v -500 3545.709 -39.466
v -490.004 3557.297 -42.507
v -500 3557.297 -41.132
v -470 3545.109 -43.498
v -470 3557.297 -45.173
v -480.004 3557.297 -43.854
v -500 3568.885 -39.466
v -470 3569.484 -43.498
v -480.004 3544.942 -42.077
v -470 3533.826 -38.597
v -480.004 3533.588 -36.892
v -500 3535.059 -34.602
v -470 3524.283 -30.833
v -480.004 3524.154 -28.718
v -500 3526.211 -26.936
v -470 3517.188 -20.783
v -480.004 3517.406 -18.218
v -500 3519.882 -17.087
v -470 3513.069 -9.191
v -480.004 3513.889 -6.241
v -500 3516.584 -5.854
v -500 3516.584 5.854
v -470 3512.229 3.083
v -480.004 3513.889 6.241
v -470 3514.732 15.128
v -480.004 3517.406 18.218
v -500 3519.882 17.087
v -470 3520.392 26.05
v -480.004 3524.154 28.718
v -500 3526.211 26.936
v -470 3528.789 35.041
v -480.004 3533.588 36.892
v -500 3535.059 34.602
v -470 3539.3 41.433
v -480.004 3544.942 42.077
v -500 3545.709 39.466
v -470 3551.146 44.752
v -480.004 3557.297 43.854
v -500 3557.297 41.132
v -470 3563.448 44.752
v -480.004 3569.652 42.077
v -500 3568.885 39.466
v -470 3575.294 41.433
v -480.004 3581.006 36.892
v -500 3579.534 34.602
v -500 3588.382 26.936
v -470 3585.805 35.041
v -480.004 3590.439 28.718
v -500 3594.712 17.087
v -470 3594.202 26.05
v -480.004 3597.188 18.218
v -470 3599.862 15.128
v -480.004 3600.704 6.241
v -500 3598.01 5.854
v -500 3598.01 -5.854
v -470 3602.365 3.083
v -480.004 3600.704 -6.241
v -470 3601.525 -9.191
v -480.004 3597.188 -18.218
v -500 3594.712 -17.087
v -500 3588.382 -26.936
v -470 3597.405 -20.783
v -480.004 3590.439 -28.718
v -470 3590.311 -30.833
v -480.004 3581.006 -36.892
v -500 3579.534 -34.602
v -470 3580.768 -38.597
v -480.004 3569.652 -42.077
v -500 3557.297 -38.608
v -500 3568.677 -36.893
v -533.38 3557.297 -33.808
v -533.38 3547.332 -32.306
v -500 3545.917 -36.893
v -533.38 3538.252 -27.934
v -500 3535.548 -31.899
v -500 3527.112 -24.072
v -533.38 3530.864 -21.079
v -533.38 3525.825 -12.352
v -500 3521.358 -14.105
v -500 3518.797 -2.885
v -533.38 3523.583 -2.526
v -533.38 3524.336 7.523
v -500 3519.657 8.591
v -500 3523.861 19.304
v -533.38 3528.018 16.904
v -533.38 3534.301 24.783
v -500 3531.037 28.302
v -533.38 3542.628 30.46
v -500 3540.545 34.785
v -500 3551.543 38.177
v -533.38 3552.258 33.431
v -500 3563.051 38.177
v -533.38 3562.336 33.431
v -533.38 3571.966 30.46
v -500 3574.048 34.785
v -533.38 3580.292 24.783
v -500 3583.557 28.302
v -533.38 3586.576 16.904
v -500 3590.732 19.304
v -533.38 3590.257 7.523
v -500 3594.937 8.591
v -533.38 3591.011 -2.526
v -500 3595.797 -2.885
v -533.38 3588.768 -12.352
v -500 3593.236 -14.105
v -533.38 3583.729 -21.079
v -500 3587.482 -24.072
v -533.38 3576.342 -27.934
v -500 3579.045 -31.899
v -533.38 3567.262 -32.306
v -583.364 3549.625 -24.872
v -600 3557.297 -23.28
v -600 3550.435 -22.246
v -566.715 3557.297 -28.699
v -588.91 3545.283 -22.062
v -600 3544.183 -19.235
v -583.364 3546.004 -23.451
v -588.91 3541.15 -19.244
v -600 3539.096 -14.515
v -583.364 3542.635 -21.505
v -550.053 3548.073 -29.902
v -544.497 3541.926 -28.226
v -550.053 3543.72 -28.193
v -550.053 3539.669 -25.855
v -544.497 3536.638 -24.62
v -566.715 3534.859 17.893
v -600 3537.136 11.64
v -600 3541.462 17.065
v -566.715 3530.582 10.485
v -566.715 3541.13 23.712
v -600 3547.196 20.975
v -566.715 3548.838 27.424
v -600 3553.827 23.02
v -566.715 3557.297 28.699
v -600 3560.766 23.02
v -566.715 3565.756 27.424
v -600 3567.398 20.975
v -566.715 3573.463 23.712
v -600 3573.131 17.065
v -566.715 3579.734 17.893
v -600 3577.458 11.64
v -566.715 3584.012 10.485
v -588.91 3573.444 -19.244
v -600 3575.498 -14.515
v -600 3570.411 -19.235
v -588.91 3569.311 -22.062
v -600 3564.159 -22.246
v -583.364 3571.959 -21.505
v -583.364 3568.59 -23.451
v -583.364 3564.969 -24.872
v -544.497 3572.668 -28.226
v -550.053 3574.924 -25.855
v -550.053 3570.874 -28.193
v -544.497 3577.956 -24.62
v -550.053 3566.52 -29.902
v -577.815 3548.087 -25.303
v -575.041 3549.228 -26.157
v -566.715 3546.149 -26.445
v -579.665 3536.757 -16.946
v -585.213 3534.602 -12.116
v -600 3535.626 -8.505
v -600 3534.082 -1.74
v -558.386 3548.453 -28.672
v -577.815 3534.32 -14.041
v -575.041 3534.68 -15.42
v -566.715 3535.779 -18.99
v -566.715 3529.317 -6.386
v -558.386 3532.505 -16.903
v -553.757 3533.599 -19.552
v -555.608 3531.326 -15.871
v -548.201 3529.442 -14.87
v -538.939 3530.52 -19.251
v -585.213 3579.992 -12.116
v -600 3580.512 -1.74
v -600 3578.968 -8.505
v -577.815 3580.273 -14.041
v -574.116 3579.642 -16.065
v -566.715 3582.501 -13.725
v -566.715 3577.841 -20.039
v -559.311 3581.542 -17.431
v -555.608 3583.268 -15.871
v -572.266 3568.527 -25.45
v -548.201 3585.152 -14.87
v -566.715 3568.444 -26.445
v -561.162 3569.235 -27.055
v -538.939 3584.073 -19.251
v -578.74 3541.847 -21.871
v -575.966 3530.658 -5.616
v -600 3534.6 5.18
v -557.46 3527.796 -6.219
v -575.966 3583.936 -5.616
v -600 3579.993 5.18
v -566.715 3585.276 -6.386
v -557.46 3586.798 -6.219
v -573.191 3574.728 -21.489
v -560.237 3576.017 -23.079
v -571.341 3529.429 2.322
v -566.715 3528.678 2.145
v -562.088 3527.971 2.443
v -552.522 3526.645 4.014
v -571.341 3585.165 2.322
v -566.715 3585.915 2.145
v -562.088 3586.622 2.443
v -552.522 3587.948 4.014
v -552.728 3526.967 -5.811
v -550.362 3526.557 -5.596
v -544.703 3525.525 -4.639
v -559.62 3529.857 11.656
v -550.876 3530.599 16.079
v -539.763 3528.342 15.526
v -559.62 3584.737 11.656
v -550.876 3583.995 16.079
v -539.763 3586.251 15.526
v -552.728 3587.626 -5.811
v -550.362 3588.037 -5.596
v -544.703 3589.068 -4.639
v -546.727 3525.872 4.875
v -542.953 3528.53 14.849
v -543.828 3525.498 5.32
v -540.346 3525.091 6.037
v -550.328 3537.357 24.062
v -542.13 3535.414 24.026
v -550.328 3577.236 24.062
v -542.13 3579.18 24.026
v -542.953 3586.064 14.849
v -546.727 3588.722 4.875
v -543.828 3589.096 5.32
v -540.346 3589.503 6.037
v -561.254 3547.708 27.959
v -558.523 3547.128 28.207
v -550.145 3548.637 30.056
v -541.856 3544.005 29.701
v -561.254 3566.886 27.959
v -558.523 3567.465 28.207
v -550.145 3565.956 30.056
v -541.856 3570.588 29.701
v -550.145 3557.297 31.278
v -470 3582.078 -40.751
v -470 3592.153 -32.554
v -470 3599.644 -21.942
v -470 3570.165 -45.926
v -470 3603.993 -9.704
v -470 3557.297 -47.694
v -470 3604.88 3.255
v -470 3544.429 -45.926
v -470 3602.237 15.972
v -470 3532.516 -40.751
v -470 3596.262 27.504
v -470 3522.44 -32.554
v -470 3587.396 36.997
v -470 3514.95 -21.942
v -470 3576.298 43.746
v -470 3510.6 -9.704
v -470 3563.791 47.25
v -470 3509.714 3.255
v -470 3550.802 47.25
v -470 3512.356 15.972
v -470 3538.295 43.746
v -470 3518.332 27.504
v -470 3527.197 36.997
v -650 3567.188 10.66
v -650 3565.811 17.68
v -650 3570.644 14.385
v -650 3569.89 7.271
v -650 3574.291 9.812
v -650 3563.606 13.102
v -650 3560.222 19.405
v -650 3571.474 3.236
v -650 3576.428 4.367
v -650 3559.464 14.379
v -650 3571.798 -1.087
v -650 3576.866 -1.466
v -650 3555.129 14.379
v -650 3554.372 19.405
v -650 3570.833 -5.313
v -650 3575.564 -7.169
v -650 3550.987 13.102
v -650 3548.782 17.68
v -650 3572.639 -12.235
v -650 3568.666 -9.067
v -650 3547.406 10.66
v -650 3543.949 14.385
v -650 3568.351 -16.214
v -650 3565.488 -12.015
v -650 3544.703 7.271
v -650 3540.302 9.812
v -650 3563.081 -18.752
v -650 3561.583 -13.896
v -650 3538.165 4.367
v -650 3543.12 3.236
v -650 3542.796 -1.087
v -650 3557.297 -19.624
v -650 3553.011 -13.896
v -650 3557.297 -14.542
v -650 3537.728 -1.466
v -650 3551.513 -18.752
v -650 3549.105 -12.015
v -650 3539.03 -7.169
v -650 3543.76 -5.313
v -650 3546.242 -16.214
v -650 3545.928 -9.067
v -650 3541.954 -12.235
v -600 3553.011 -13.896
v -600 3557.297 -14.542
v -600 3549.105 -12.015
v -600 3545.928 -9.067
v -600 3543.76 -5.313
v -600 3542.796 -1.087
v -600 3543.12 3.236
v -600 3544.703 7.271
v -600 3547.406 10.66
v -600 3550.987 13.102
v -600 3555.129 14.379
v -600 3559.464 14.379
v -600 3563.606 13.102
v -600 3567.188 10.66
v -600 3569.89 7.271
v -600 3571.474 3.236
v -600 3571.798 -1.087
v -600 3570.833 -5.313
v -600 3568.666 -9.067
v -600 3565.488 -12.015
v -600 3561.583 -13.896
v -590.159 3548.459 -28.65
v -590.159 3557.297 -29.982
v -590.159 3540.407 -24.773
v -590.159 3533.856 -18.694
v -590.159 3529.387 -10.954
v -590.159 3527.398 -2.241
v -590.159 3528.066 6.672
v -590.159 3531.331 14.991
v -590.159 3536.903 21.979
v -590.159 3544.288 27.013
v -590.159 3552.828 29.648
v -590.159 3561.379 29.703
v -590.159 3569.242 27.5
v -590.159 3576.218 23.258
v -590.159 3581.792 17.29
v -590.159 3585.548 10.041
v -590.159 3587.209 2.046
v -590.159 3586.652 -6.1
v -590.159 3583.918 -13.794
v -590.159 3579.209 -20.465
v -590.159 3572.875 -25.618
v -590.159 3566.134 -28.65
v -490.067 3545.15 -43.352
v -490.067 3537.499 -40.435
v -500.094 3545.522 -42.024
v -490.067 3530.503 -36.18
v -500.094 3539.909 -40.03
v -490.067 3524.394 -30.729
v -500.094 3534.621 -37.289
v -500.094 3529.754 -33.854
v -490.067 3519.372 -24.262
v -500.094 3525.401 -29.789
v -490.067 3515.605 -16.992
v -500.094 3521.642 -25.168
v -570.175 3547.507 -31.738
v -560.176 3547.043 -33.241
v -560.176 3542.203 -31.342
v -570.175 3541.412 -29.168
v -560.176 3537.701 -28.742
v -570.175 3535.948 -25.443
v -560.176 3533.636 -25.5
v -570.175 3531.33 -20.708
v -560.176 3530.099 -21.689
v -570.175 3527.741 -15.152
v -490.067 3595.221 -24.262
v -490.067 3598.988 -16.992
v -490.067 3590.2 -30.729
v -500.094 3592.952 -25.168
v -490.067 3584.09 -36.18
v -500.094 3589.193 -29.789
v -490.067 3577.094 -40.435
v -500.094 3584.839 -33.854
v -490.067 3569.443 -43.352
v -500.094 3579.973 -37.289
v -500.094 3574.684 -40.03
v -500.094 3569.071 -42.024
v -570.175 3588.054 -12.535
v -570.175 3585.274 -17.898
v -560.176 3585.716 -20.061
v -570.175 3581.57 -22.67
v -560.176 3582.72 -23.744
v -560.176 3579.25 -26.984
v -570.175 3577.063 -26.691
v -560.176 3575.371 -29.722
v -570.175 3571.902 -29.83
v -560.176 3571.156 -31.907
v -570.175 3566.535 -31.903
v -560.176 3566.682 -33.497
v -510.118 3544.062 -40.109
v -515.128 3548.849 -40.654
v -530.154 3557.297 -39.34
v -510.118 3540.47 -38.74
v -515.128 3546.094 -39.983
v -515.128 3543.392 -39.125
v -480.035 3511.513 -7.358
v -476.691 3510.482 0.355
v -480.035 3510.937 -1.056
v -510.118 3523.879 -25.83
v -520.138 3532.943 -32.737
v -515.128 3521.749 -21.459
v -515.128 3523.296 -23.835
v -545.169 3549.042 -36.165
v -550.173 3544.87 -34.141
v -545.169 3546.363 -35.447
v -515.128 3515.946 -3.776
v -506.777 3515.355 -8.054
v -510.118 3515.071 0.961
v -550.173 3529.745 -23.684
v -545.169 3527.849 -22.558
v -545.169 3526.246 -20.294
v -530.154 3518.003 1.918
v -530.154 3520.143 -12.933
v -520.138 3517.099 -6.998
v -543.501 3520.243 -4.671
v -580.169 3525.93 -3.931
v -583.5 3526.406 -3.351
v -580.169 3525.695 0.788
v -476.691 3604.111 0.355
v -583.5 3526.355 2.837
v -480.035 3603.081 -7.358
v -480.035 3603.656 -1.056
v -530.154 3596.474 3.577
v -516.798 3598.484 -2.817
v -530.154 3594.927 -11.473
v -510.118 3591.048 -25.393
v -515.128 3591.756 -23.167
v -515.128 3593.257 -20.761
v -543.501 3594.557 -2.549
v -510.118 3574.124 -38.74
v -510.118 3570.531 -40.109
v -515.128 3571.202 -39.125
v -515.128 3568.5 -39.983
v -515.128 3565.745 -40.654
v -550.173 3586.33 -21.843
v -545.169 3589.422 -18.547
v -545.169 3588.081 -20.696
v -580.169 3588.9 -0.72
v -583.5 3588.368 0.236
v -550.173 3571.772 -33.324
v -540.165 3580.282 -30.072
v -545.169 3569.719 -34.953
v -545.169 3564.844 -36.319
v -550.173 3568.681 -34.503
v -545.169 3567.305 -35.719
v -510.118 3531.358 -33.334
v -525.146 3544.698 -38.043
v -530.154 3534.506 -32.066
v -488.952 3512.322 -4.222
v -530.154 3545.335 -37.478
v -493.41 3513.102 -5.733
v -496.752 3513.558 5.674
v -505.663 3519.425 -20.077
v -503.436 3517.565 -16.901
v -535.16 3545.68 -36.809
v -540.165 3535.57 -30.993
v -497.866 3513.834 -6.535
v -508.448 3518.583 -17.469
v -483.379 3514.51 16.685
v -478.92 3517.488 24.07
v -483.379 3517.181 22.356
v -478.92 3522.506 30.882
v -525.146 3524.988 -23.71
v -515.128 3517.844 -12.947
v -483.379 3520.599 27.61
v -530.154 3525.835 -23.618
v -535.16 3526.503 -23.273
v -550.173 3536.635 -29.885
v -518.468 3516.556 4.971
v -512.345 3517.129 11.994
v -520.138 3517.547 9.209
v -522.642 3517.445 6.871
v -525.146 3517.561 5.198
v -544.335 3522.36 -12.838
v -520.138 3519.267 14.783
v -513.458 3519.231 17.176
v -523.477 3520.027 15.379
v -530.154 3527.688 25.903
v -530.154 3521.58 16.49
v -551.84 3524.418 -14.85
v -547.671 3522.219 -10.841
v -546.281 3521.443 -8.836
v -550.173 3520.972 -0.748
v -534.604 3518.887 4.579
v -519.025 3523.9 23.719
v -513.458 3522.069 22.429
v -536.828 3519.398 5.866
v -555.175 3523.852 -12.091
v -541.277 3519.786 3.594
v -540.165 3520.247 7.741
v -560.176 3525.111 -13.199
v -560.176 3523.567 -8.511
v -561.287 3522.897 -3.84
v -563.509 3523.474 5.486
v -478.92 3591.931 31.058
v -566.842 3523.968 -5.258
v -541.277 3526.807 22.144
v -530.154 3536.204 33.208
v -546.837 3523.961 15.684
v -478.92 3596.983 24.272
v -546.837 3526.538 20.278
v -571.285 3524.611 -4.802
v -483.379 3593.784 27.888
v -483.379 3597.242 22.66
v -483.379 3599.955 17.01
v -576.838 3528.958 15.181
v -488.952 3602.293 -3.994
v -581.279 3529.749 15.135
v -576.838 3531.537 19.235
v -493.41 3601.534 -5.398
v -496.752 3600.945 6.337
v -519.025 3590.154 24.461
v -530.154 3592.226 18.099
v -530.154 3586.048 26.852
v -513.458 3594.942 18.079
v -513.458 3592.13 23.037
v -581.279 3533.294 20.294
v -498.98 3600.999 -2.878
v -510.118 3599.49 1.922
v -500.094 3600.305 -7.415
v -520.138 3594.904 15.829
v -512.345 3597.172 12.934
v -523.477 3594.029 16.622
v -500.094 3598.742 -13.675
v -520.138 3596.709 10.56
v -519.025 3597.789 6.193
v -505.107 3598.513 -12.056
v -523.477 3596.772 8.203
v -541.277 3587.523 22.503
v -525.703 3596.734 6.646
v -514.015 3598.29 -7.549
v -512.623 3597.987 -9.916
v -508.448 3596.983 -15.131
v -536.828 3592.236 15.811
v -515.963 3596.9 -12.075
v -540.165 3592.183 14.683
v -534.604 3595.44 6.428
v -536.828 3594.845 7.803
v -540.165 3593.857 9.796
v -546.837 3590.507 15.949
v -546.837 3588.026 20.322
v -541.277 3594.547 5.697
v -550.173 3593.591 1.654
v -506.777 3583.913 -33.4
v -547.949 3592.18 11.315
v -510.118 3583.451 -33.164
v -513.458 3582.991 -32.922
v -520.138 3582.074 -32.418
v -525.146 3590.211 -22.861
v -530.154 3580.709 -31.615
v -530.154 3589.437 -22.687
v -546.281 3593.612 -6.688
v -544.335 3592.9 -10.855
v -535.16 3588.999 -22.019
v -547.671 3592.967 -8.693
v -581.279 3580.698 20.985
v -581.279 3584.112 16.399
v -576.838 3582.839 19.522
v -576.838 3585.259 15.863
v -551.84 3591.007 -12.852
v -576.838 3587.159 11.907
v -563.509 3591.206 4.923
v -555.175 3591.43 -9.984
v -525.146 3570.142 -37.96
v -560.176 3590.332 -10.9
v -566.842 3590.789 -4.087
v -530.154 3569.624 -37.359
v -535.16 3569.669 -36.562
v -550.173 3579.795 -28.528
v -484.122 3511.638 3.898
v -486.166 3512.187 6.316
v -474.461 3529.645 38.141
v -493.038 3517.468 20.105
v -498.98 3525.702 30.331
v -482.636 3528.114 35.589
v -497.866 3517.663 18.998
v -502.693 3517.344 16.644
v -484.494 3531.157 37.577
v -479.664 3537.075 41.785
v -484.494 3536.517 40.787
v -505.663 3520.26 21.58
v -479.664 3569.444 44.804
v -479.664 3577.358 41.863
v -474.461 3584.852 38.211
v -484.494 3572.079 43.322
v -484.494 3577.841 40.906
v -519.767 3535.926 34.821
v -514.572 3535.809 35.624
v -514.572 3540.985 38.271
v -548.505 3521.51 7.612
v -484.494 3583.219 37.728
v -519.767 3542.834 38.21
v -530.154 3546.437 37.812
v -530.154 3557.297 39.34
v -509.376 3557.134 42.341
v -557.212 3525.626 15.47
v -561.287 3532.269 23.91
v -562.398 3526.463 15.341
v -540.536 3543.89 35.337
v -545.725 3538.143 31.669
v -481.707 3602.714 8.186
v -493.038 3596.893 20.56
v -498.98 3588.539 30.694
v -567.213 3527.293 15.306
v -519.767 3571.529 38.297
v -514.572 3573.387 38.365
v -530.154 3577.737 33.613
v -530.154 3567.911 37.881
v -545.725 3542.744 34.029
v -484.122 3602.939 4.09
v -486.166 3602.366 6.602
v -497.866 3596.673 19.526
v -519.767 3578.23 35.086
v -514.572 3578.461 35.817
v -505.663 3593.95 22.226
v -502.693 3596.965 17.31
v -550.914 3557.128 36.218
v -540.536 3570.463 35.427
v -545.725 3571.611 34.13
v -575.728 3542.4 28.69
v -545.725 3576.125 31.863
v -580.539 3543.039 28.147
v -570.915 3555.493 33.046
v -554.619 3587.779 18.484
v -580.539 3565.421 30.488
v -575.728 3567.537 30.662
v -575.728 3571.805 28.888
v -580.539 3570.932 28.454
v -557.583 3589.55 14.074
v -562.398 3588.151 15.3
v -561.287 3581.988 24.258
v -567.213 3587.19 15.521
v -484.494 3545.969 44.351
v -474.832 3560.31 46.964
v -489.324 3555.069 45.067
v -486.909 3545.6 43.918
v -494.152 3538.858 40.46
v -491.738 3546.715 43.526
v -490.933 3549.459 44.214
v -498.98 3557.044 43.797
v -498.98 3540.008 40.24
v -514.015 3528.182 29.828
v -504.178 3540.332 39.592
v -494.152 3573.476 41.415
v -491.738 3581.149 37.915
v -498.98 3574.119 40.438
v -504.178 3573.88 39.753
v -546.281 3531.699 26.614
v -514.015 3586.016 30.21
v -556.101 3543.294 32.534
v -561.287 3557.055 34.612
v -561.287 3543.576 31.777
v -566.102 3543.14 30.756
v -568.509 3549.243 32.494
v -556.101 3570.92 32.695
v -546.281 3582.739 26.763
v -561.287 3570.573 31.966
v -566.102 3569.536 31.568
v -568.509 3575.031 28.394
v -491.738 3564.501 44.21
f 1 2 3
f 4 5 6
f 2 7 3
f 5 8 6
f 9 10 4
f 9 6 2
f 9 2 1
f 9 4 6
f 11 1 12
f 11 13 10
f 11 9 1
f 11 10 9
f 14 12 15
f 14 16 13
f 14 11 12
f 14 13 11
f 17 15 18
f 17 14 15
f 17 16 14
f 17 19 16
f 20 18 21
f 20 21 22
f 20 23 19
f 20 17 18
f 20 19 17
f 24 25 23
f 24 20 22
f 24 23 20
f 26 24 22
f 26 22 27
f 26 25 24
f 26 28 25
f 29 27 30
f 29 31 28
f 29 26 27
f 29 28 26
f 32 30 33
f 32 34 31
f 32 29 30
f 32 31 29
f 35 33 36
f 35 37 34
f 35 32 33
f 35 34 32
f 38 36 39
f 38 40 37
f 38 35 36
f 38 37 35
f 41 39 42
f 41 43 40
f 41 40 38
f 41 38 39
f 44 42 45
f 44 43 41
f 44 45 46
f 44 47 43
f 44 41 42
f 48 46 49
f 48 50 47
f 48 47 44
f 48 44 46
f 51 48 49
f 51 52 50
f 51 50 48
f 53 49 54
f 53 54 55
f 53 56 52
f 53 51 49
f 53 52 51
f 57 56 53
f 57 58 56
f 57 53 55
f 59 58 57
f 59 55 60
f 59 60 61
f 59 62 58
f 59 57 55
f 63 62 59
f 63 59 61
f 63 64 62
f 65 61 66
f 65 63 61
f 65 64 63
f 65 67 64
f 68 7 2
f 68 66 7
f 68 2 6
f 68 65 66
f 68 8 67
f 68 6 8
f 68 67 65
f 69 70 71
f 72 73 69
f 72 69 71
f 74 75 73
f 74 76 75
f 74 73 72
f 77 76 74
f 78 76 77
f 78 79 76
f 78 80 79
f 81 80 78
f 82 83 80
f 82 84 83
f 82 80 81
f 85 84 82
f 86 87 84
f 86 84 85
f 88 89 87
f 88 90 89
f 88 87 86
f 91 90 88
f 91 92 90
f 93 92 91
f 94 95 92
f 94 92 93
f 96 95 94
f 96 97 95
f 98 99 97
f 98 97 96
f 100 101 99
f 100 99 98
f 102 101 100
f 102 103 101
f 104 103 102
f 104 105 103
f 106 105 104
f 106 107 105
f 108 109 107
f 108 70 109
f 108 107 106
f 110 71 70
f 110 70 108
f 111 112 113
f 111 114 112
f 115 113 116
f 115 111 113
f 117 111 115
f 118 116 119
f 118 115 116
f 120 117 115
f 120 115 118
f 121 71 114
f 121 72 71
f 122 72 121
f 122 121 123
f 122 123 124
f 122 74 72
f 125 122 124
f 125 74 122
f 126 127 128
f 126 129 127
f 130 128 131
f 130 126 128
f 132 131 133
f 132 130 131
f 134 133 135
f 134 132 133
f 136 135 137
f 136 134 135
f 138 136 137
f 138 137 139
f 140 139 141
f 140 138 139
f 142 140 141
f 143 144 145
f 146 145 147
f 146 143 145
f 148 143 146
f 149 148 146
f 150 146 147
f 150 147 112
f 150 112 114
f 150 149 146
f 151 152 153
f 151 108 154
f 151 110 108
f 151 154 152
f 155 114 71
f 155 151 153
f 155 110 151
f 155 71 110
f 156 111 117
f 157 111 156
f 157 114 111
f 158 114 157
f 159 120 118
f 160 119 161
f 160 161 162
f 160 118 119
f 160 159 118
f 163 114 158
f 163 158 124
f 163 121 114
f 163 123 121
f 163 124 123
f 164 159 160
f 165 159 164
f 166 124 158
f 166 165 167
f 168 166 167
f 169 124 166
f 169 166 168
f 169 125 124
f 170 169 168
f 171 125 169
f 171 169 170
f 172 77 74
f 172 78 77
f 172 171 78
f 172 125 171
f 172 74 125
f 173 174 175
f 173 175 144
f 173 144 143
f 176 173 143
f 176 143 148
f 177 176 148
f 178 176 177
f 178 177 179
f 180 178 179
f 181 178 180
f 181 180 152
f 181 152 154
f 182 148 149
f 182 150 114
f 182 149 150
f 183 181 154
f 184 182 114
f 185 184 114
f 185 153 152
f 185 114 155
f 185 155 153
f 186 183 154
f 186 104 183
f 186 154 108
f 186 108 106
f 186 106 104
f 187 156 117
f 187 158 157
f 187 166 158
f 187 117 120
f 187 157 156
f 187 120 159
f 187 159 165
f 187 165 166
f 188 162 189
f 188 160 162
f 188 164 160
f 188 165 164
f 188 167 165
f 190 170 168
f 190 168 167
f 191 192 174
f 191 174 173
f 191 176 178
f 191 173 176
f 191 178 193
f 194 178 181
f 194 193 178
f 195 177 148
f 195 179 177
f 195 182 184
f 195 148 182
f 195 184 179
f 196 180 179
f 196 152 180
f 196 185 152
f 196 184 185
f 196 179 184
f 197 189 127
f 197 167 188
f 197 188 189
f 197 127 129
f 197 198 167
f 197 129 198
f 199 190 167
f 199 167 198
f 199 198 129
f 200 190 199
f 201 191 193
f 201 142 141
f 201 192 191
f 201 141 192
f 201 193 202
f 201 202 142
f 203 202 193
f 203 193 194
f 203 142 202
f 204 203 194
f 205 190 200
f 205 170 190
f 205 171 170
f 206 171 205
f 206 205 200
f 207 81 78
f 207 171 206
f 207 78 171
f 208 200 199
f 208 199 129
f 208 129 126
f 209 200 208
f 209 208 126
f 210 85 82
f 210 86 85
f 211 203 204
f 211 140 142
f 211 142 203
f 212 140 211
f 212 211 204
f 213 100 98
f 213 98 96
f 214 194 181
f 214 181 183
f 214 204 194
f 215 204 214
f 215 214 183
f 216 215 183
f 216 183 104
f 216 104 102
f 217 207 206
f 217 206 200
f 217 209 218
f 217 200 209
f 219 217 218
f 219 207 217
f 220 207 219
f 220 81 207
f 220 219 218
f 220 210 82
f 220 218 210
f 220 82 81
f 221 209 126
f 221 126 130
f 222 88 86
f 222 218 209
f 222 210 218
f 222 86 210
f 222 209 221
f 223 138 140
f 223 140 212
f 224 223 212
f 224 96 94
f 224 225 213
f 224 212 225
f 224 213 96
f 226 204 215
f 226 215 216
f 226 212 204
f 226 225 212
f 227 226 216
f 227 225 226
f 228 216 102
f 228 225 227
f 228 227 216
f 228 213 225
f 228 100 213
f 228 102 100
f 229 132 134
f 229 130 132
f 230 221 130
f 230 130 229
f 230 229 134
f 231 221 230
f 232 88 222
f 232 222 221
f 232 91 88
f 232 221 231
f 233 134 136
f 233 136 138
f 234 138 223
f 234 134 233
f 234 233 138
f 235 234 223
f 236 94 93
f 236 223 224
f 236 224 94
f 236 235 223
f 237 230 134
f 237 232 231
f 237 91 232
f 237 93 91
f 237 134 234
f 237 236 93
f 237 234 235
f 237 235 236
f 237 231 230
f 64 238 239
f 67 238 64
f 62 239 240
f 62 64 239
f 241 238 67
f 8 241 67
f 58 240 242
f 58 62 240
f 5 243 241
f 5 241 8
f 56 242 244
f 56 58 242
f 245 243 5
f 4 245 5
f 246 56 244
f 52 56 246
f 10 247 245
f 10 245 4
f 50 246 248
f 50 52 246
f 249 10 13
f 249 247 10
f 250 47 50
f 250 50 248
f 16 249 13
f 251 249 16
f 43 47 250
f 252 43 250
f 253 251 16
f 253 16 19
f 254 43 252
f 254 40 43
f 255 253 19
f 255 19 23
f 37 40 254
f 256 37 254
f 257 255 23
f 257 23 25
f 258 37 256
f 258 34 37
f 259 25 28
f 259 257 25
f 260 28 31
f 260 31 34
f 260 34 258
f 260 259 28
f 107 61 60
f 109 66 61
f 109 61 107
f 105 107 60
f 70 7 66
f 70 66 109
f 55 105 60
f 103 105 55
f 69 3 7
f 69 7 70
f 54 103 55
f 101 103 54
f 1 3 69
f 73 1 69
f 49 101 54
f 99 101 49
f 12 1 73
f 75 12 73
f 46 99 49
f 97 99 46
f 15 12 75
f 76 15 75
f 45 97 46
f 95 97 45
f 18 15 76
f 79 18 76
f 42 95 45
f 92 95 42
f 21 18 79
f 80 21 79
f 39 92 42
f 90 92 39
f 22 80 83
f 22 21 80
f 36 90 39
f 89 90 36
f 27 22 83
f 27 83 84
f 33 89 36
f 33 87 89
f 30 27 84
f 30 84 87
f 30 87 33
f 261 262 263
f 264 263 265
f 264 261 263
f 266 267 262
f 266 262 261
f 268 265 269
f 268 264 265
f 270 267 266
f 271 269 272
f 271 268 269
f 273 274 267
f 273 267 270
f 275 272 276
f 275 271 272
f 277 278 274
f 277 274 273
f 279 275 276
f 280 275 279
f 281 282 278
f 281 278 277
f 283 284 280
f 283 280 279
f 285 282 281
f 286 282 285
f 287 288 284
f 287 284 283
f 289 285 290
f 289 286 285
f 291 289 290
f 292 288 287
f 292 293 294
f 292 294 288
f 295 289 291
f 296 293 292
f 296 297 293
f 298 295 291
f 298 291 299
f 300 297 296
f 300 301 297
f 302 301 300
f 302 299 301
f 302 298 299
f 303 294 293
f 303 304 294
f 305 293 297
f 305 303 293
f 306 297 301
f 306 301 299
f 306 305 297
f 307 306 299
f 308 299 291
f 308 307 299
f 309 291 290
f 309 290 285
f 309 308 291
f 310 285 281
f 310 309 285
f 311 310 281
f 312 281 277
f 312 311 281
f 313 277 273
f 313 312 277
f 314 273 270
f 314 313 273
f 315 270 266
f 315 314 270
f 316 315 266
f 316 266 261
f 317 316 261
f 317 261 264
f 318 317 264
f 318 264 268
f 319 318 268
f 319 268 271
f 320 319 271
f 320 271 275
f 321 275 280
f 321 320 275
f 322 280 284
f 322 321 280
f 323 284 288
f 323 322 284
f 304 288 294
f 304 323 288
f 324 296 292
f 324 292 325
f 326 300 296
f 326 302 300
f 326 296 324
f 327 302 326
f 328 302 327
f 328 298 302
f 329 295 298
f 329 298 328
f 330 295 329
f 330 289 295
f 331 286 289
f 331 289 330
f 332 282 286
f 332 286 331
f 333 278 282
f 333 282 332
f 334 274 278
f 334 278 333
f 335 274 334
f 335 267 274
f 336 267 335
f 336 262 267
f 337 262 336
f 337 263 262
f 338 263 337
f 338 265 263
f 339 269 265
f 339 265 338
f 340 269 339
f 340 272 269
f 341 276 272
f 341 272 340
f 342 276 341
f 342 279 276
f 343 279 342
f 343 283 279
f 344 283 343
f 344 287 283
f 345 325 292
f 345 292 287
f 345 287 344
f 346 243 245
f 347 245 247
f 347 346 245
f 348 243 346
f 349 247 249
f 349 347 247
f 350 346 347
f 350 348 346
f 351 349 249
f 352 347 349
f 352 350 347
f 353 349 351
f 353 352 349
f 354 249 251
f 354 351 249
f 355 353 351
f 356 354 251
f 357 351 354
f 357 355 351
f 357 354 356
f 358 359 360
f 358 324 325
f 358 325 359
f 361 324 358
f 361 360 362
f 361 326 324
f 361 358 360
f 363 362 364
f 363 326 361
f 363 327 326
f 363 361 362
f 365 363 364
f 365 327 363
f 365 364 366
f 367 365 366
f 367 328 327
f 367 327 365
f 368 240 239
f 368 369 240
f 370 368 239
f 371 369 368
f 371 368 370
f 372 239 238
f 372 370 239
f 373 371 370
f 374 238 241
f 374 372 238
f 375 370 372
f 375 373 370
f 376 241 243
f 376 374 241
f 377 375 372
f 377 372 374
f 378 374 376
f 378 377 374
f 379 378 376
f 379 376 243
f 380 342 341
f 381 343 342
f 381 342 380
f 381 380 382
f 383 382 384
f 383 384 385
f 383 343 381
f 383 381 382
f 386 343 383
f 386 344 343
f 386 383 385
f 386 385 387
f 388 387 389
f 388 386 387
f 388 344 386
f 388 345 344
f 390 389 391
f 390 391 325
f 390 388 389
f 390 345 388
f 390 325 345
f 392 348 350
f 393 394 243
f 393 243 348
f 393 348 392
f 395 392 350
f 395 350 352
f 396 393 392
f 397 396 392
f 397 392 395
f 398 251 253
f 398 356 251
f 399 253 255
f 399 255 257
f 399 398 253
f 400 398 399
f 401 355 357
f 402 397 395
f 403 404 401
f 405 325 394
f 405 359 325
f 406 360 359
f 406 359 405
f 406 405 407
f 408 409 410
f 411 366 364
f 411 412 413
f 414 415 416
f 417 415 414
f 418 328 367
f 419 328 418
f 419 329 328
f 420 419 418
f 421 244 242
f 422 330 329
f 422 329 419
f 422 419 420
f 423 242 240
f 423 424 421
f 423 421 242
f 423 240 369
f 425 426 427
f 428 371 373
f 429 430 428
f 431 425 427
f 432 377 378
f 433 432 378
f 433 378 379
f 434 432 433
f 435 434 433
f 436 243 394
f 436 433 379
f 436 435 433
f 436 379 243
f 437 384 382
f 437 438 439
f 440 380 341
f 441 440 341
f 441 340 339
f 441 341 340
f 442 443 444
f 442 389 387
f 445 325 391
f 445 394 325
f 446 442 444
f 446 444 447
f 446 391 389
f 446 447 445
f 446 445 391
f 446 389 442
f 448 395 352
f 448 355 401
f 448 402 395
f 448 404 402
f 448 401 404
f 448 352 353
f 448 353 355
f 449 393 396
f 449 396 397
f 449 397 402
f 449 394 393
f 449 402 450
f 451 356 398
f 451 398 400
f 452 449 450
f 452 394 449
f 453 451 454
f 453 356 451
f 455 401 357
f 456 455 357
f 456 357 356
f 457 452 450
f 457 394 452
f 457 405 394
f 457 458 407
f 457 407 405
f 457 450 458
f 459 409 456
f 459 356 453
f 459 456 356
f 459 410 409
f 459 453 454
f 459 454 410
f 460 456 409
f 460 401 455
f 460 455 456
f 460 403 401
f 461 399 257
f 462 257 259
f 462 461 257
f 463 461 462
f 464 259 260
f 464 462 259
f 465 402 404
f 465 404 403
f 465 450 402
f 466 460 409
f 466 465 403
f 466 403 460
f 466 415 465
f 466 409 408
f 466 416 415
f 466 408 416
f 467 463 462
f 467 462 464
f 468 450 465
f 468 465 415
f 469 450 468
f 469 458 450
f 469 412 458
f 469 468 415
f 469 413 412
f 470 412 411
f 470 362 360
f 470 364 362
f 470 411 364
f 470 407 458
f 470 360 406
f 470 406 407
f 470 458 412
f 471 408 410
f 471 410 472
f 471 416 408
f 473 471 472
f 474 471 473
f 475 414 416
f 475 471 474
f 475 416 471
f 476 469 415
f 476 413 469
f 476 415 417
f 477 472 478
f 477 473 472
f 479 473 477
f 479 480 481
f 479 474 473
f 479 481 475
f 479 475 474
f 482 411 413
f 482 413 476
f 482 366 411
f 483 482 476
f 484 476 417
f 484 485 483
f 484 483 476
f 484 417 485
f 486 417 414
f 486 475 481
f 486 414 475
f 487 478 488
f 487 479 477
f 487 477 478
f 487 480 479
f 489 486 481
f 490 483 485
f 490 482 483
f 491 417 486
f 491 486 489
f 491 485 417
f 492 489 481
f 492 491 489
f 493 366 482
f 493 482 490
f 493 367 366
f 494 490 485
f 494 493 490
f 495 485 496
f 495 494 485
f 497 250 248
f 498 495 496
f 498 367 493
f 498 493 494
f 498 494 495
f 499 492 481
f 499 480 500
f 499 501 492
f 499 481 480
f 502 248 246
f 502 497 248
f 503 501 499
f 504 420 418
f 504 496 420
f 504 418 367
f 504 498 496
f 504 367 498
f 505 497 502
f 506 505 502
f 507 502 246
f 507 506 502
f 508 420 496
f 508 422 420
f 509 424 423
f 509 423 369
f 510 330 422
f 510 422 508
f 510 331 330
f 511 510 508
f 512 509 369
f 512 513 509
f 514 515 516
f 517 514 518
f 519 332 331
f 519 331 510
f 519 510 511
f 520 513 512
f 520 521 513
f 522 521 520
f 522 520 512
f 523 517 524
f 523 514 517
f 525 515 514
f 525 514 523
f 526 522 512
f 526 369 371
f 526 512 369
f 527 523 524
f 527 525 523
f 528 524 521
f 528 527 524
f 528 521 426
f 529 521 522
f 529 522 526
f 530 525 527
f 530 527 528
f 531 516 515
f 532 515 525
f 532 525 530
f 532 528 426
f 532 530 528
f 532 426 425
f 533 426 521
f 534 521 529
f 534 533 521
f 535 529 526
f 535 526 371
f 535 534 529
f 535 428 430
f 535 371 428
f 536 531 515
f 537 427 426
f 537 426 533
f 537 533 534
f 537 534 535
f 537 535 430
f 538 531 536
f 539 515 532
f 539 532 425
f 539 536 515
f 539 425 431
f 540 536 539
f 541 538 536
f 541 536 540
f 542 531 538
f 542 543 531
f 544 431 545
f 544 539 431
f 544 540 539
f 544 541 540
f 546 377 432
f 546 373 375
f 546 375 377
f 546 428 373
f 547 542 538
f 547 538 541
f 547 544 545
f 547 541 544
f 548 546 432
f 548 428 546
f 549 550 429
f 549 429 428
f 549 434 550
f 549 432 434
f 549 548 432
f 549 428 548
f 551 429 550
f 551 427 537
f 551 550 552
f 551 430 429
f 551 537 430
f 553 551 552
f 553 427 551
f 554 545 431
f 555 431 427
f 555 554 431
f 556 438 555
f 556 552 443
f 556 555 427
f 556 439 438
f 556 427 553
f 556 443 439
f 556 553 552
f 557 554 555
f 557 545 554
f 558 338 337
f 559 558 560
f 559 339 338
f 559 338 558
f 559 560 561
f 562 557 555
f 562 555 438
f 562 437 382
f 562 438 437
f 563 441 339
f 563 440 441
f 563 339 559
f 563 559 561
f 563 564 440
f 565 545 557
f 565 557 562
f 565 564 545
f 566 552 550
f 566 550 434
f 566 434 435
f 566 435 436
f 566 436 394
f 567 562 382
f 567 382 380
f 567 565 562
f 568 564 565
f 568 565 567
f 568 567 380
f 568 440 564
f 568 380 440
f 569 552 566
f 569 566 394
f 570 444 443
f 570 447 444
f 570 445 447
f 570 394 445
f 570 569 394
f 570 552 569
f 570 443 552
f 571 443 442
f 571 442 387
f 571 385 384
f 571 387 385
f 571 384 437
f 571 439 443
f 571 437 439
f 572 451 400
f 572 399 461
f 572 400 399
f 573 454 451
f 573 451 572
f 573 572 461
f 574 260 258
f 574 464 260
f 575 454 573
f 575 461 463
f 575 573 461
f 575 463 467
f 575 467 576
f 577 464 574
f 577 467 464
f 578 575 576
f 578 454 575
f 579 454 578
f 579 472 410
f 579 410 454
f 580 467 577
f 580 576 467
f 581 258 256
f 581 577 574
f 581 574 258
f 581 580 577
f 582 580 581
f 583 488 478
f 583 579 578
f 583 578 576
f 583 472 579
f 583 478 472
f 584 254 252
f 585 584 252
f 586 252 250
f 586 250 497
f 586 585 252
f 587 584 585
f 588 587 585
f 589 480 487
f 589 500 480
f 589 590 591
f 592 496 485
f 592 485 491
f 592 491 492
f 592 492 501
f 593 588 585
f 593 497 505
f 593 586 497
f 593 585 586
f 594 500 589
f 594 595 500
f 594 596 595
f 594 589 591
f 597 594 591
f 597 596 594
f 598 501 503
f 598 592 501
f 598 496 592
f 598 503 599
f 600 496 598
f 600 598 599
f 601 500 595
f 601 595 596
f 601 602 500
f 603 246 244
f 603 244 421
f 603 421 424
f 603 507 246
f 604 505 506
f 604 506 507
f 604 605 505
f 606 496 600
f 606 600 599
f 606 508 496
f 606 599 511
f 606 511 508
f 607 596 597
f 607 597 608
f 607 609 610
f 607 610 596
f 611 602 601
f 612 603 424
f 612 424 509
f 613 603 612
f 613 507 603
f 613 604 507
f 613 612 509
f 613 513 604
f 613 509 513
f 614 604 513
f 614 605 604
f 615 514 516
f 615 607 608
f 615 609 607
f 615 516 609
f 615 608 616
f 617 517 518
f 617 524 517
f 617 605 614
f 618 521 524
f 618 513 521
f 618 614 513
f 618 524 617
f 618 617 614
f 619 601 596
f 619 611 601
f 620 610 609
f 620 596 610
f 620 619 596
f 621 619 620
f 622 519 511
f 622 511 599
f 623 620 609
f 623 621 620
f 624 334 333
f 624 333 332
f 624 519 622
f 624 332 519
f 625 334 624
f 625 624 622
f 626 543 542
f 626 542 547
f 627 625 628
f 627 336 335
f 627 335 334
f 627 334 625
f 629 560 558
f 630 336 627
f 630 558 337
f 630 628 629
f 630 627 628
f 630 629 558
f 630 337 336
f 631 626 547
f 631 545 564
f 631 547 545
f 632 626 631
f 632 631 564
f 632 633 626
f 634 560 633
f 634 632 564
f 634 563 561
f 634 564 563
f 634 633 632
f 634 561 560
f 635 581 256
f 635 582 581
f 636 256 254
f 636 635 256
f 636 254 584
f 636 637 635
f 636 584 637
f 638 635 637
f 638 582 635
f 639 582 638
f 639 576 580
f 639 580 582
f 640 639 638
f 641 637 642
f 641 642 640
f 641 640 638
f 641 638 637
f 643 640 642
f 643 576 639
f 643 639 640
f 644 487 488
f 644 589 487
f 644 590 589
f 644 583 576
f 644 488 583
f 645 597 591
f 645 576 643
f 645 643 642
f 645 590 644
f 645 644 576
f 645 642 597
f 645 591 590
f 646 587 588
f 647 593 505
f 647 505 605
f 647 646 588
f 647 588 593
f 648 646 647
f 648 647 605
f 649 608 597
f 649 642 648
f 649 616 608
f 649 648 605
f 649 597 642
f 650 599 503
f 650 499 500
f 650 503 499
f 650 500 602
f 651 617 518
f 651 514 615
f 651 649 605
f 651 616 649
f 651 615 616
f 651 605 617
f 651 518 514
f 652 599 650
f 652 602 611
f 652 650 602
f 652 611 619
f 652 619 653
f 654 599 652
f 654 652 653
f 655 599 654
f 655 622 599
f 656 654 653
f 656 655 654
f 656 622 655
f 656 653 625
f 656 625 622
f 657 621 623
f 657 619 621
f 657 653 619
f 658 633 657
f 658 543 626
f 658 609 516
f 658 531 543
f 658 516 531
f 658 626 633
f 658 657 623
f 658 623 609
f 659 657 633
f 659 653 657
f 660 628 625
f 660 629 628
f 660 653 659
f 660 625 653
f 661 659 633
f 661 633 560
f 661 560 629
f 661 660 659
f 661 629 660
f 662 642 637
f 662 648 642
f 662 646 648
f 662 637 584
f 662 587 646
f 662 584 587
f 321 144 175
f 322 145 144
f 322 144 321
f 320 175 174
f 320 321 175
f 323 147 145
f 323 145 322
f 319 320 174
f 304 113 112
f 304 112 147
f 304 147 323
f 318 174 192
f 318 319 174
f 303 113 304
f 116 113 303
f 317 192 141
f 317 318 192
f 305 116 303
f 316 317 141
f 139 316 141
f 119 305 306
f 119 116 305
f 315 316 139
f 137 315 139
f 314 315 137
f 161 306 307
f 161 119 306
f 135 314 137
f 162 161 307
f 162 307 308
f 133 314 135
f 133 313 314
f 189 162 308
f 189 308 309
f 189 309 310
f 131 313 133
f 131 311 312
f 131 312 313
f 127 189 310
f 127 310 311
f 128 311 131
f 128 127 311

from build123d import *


with BuildPart() as part:
    # Sketch1 → Revolve1 (revolve)
    with BuildSketch(Plane.XY, mode=Mode.PRIVATE) as revolve1_sk:
        with BuildLine():
            Line((-470, 3602.469847202), (-470, 3604.991019406))
            ThreePointArc((-470, 3604.991019406), (-560.175855014, 3592.083415159), (-650, 3576.920498138))
            Line((-650, 3576.920498138), (-650, 3571.838497189))
            Line((-650, 3571.838497189), (-600, 3571.838497189))
            Line((-600, 3571.838497189), (-600, 3580.576804092))
            ThreePointArc((-600, 3580.576804092), (-550.053393511, 3588.589070134), (-499.999999999, 3595.904649737))
            Line((-499.999999999, 3595.904649737), (-499.999999999, 3598.125802414))
            Line((-499.999999999, 3598.125802414), (-499.999999999, 3598.428684857))
            ThreePointArc((-499.999999999, 3598.428684857), (-485.004209, 3600.480511995), (-470, 3602.469847202))
        make_face()
    revolve(revolve1_sk.sketch.rotate(Axis((0, 3557.296761587, 0), (-1, 0, 0)), 90), axis=Axis((0, 3557.296761587, 0), (-1, 0, 0)))


solid = part.part
